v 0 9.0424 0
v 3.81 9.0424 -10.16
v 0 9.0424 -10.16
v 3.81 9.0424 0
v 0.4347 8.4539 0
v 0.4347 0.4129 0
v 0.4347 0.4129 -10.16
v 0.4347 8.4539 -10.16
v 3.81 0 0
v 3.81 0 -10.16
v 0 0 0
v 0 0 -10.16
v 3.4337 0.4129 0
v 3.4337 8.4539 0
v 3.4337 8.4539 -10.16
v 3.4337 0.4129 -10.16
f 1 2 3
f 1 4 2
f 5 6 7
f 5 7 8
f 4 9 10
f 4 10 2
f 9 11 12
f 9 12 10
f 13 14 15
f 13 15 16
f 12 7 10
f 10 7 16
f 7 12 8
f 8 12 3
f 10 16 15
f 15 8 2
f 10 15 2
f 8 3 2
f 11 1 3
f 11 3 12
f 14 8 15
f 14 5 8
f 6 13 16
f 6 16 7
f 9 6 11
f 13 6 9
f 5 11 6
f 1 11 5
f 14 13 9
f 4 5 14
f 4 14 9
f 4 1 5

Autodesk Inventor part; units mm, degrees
ref_plane "YZ Plane" through (0, 0, 0) normal (1, 0, 0) x (0, 1, 0)
ref_plane "XZ Plane" through (0, 0, 0) normal (0, 1, 0) x (-1, 0, 0)
ref_plane "XY Plane" through (0, 0, 0) normal (0, 0, 1) x (1, 0, 0)
sketch "Sketch1" plane through (0, 0, 0) normal (0, 0, 1) x (1, 0, 0)
  line L0 (0, 0) -> (3.81, 0)
  line L1 (3.81, 0) -> (3.81, 9.0424)
  line L2 (3.81, 9.0424) -> (0, 9.0424)
  line L3 (0, 9.0424) -> (0, 0)
  dimension "d0" = 3.81
  dimension "d1" = 9.0424
extrude "Extrusion1" add sketch "Sketch1" against normal blind 10.16
sketch "Sketch2" plane through (0, 0, 0) normal (0, 0, 1) x (1, 0, 0)
  line L0 (0.4347, 8.4539) -> (3.4337, 8.4539)
  line L1 (3.4337, 8.4539) -> (3.4337, 0.4129)
  line L2 (3.4337, 0.4129) -> (0.4347, 0.4129)
  line L3 (0.4347, 0.4129) -> (0.4347, 8.4539)
  point P0 (0, 0)
extrude "Extrusion2" cut sketch "Sketch2" against normal blind 10.16
properties part number "IR PART"
